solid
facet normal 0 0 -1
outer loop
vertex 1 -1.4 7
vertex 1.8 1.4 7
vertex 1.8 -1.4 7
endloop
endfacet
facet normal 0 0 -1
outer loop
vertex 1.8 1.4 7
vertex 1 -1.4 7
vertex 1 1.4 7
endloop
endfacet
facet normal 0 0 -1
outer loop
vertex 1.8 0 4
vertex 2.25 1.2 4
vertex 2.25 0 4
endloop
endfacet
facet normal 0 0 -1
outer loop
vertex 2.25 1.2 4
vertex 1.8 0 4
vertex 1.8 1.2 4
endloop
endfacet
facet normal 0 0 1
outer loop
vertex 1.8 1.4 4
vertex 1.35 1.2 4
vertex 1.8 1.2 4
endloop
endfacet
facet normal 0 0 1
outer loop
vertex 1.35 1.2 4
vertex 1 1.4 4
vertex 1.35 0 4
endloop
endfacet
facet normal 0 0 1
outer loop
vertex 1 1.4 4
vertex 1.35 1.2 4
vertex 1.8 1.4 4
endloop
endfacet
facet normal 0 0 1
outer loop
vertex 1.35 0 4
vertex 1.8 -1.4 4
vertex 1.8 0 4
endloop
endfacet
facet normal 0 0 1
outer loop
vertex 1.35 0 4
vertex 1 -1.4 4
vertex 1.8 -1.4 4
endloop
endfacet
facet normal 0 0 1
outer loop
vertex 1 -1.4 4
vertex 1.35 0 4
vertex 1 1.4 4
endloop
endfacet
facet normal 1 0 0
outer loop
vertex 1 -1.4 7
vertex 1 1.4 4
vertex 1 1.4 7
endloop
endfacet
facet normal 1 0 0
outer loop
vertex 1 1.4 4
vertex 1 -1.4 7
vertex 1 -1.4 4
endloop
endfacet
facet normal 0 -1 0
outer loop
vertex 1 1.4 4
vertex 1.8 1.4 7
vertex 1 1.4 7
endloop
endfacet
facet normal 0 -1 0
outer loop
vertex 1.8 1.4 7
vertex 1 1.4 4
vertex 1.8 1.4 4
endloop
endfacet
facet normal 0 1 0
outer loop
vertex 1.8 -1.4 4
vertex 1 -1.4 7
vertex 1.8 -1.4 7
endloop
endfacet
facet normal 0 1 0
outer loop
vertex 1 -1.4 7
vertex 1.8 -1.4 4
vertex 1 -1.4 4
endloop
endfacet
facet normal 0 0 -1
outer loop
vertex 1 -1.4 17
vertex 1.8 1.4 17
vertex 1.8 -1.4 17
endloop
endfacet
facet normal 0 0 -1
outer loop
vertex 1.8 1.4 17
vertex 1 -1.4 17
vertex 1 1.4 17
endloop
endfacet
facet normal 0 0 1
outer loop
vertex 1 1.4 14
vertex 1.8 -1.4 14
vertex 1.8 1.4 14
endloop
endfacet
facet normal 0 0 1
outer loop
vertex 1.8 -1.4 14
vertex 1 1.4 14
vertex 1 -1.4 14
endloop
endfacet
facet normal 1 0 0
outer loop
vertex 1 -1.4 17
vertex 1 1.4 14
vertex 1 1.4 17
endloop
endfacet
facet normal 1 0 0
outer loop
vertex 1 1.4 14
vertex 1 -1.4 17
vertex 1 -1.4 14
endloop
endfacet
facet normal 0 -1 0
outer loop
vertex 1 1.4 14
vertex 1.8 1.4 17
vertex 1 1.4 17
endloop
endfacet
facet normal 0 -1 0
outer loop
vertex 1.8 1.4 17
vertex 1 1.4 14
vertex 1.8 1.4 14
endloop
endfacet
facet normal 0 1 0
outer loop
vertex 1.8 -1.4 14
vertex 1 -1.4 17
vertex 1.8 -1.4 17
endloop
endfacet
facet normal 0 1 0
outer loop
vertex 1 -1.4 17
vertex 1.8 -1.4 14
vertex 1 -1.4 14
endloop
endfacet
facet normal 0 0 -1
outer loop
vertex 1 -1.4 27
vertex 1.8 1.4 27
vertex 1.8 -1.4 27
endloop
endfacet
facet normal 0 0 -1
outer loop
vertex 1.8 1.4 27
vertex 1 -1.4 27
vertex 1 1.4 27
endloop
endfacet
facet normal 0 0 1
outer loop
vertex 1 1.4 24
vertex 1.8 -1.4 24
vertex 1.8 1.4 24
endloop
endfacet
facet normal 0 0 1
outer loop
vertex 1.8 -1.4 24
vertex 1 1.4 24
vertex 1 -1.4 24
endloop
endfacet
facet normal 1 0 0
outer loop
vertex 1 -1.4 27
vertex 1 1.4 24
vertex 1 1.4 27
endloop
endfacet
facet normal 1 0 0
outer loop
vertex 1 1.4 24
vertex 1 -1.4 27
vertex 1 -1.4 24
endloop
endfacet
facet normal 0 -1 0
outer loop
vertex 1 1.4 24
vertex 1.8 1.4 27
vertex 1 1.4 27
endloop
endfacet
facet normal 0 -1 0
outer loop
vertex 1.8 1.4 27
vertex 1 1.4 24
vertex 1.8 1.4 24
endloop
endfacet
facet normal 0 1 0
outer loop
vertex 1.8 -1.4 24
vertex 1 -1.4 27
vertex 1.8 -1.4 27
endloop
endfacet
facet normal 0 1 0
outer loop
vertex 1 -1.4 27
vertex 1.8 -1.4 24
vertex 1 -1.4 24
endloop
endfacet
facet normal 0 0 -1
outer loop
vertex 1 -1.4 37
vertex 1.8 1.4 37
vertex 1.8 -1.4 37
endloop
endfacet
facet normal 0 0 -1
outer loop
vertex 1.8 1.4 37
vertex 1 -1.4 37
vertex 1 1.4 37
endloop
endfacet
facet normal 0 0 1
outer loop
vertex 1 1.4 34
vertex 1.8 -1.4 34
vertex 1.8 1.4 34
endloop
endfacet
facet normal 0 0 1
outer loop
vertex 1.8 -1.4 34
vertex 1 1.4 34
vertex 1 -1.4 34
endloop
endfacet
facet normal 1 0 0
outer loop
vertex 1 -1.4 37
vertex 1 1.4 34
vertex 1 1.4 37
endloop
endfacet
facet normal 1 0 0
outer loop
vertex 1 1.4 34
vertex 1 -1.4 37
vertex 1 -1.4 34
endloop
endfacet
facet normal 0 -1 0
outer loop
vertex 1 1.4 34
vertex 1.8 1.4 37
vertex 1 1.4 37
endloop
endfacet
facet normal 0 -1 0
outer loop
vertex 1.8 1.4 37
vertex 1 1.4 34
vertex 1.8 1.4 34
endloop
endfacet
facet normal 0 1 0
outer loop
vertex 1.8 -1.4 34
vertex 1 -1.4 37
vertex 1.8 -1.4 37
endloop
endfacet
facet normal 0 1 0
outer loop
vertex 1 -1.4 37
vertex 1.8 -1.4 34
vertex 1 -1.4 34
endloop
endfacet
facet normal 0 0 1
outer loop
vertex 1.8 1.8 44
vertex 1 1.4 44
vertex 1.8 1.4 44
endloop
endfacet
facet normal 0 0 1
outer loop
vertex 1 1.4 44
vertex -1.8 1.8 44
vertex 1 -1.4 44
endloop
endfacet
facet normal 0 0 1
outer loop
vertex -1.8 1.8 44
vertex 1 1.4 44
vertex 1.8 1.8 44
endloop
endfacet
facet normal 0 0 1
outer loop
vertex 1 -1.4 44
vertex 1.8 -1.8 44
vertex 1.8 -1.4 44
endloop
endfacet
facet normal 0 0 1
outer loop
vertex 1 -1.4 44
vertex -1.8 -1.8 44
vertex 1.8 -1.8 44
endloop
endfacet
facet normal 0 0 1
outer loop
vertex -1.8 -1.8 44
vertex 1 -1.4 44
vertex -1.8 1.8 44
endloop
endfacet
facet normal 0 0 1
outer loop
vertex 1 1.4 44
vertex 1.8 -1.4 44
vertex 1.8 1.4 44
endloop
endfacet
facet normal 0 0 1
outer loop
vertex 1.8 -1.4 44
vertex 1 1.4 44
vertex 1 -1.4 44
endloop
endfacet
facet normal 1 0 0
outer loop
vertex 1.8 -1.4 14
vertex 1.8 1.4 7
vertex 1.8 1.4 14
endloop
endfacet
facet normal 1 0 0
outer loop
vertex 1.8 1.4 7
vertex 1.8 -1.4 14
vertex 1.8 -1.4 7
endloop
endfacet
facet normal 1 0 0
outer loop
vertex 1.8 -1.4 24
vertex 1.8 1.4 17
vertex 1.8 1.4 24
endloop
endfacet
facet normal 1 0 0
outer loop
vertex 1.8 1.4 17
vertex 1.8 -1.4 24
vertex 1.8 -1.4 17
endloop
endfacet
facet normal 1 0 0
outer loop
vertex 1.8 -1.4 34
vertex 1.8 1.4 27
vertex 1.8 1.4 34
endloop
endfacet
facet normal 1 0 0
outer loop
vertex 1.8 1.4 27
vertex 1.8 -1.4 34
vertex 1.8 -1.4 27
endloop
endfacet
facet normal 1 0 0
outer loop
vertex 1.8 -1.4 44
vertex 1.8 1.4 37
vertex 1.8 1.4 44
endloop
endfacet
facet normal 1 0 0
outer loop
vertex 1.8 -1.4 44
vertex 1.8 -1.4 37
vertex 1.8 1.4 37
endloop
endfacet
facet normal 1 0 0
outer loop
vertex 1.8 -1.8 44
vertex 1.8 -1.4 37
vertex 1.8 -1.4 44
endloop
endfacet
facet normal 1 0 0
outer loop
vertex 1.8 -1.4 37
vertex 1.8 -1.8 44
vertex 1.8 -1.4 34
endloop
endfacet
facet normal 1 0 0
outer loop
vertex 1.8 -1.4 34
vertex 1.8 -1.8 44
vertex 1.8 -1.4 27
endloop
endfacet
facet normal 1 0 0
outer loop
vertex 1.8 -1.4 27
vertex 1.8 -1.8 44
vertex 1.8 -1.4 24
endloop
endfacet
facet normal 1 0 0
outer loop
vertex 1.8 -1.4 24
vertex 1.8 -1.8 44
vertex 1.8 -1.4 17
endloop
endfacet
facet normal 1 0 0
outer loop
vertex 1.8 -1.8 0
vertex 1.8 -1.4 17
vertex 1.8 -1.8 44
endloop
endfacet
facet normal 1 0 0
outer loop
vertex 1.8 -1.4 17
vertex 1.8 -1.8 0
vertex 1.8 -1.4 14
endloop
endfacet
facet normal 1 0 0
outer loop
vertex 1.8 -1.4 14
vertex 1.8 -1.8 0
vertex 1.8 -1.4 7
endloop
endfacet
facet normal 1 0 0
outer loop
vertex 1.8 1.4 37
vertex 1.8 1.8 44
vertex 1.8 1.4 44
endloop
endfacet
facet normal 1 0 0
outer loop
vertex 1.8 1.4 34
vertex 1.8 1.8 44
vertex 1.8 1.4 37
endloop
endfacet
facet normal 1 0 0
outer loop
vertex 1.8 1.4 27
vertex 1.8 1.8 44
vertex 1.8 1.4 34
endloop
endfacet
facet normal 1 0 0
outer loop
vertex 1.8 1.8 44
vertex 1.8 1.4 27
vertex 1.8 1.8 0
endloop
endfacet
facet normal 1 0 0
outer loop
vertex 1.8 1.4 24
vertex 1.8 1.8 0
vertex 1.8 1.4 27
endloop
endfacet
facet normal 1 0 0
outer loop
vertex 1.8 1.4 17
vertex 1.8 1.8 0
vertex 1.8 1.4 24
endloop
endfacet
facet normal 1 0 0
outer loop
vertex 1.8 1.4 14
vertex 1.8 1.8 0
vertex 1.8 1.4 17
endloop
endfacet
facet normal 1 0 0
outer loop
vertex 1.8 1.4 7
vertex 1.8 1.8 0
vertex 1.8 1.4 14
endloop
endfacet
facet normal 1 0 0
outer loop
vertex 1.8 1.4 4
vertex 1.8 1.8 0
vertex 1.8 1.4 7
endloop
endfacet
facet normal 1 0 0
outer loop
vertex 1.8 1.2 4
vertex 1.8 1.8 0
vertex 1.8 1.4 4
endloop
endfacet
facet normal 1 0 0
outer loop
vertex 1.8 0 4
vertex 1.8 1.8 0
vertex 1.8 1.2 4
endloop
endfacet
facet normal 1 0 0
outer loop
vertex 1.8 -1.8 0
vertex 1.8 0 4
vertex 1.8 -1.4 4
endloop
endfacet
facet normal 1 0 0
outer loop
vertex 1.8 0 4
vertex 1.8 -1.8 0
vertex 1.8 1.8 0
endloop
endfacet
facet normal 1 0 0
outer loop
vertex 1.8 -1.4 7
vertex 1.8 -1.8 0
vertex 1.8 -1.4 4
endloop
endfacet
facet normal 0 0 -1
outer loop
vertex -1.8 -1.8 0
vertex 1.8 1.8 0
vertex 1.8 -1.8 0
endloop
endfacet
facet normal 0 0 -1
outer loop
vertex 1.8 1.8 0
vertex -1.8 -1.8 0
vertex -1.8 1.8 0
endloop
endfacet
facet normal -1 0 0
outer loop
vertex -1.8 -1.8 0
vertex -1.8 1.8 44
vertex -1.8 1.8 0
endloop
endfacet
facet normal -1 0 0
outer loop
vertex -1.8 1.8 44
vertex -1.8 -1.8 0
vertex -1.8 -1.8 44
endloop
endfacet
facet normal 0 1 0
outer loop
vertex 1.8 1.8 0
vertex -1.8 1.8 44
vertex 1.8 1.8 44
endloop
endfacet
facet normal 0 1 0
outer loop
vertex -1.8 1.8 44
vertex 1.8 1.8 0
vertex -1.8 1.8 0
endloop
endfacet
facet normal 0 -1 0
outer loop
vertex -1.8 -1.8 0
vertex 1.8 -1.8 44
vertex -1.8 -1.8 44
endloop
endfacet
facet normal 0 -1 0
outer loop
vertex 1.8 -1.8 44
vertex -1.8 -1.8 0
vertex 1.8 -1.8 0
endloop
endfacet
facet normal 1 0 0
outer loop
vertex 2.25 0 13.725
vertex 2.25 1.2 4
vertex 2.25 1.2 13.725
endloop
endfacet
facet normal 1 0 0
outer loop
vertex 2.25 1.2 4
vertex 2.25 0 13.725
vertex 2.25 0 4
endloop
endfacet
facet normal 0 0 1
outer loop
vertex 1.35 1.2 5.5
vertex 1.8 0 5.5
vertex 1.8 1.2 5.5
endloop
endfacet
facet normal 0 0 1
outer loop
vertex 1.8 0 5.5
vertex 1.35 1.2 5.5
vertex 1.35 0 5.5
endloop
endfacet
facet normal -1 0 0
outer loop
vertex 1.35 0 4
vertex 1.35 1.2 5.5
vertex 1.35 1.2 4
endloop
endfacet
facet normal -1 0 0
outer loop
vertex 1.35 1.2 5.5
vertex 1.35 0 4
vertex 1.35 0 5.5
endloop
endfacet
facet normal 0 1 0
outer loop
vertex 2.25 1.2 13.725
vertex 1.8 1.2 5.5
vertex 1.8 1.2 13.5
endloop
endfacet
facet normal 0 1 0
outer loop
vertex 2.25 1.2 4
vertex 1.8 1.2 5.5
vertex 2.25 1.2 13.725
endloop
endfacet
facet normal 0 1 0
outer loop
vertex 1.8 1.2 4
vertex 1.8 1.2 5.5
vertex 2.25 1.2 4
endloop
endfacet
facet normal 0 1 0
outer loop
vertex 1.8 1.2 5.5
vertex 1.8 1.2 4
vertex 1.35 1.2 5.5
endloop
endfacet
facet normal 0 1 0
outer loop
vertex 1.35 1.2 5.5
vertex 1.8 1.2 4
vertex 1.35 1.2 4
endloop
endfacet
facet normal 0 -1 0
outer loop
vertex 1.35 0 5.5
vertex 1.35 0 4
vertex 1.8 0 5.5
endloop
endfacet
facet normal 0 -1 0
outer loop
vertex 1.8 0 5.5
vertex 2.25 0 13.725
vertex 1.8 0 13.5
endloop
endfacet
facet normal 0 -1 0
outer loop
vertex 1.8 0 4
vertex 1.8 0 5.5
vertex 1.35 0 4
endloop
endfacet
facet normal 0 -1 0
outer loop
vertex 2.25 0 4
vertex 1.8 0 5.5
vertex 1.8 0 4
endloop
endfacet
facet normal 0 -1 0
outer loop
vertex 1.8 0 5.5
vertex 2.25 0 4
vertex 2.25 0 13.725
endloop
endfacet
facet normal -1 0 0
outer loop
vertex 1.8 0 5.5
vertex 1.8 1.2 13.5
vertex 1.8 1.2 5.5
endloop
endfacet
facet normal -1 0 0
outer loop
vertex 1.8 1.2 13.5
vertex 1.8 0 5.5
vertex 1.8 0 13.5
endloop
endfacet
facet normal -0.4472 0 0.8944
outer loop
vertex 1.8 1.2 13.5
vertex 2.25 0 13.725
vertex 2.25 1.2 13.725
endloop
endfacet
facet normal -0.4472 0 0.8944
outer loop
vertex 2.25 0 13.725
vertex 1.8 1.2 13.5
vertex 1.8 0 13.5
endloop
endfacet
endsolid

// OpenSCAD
// design calculation S6-LC ultra-low-cost shape display -- real OpenSCAD geometry.
//
// EVIDENCE CLASS: CAD (geometry only). No print, no measurement (design calculation).
// All dimensions are mirrored from ../analysis/s6lc.py.
//
// Machine: 8 banks of 10 rows (80x80 = 6,400 cells) at 5.08 mm pitch.
//   * square printed columns with a 5-pocket vertical rack (10 mm pockets);
//   * printed cantilever pawls (0.90 x 1.20 x 8.00 mm) holding a column;
//   * per-bank threshold mask gate (printed sliding comb) read from a medium;
//   * 8 banked release combs on a travelling reset carriage;
//   * one 4-screw belt-synced platen (printed frame, excluded from the BOM).
//
// Render (real OpenSCAD):
//   openscad -o s6lc_cell.stl       -D 'PART="cell"'    s6lc_machine.scad
//   openscad -o s6lc_bank.stl       -D 'PART="bank"'    s6lc_machine.scad
//   openscad -o s6lc_platen.stl     -D 'PART="platen"'  s6lc_machine.scad

PART = "cell";

// ---- product / geometry constants (analysis/s6lc.py) ----------------------
PITCH       = 5.08;
BODY        = 3.60;      // square column body (S1 lane budget: 3.60 + 1.48 = 5.08)
COL_H       = 44.0;      // column height (40 mm travel + 4 mm base)
TRAVEL      = 40.0;
LEVEL       = 10.0;
POCKET_H    = 3.0;       // rack pocket depth in Z
POCKET_D    = 0.8;       // rack pocket depth in X (S1 coupon)
PAWL_T      = 0.90;      // 2 extrusion lines
PAWL_W      = 1.20;
PAWL_L      = 8.00;
ROWS_BANK   = 10;
COLS        = 80;
BANKS       = 8;

$fn = 48;

module column_with_rack() {
    // Square column body with 5 rack pockets on the +X face.
    difference() {
        translate([-BODY/2, -BODY/2, 0]) cube([BODY, BODY, COL_H]);
        // rack pockets at 0,10,20,30,40 mm above the base
        for (k = [0:4]) {
            translate([BODY/2 - POCKET_D, -BODY/2 + 0.4, 4 + k*LEVEL])
                cube([POCKET_D + 1, BODY - 0.8, POCKET_H]);
        }
    }
}

module pawl() {
    // Rooted cantilever: base block + thin leaf with a wedge toe.
    // design calculation/A1: the ROOT block is anchored OUTBOARD of the pitch band (in the
    // frame); only the thin LEAF (PAWL_T/2 = 0.45 mm) enters the owned 0.74 mm
    // lane. Leaf set back so its outer face stays <= 0.74 mm from the body edge.
    translate([0, 0, 0]) cube([PAWL_T, PAWL_W, 1.5]);          // root block (frame side)
    translate([PAWL_T - PAWL_T/2, 0, 1.5])
        cube([PAWL_T/2, PAWL_W, PAWL_L]);                       // thin leaf (enters lane)
    // toe wedge at the free end (points into the rack)
    translate([PAWL_T - PAWL_T/2, 0, 1.5 + PAWL_L - 1.2])
        multmatrix([[1,0,0,0],[0,1,0,0],[0.5,0,1,0],[0,0,0,1]])
            cube([PAWL_T/2, PAWL_W, 1.2]);
}

module mask_gate() {
    // Printed sliding comb: body bar + bosses over cells that must be BLOCKED.
    // One per bank (COLS = 80 cells wide); boss pitch = PITCH.
    bar_w = COLS * PITCH;
    translate([0, 0, 0]) cube([bar_w, 1.2, 1.0]);
    for (i = [0 : COLS-1]) {
        // alternating boss pattern is illustrative geometry; the real pattern
        // comes from the map. This renders the printable comb envelope.
        if (i % 2 == 0)
            translate([i*PITCH + PITCH/2 - 0.44, -0.4, 1.0])
                cube([0.88, 2.0, 1.2]);
    }
}

module release_comb() {
    // One bank release comb: a bar with a toe under every cell, lifted by the
    // travelling carriage to trip all pawls of the bank at reset.
    bar_w = COLS * PITCH;
    translate([0, 0, 0]) cube([bar_w, 1.2, 1.0]);
    for (i = [0 : COLS-1]) {
        translate([i*PITCH + PITCH/2 - 0.44, 0.8, 1.0])
            cube([0.88, 1.6, 1.0]);
    }
}

module bank_row() {
    // One row of a bank: 80 cells at true pitch, with pawl + gate lanes.
    for (i = [0 : COLS-1]) {
        translate([i*PITCH, 0, 0]) {
            column_with_rack();
        }
    }
    // pawl lane sits in the Y gap between rows (not rendered per cell here for
    // clarity of the row envelope; the cell module includes the pawl).
}

module cell_assembly() {
    // The unit-cell mechanism: column + pawl (side-by-side lane) + gate lane.
    // design calculation/A1: body edge at BODY/2 = 1.80 mm; owned lane runs to the half
    // pitch 2.54 mm. Place the pawl root so the LEAF outer face stays within
    // the half pitch: origin x0 = BODY/2 - (PAWL_T - PAWL_T/2).
    column_with_rack();
    translate([BODY/2 - (PAWL_T - PAWL_T/2), 0, 4]) pawl();
}

module bank_assembly() {
    // A bank: the full 80-column width at true pitch, rendered as 3
    // representative rows to keep the mesh tractable (the envelope width
    // 80 * PITCH = 406.4 mm is the printability-relevant dimension; the row
    // count does not change any gate). The real bank is 10 rows, sub-tiled.
    for (r = [0 : 2]) {
        translate([0, r*PITCH, 0]) bank_row();
    }
}

if (PART == "cell")     cell_assembly();
if (PART == "bank")     bank_assembly();
if (PART == "gate")     mask_gate();
if (PART == "comb")     release_comb();
if (PART == "platen")   cube([COLS*PITCH, ROWS_BANK*PITCH, 2.0]);
